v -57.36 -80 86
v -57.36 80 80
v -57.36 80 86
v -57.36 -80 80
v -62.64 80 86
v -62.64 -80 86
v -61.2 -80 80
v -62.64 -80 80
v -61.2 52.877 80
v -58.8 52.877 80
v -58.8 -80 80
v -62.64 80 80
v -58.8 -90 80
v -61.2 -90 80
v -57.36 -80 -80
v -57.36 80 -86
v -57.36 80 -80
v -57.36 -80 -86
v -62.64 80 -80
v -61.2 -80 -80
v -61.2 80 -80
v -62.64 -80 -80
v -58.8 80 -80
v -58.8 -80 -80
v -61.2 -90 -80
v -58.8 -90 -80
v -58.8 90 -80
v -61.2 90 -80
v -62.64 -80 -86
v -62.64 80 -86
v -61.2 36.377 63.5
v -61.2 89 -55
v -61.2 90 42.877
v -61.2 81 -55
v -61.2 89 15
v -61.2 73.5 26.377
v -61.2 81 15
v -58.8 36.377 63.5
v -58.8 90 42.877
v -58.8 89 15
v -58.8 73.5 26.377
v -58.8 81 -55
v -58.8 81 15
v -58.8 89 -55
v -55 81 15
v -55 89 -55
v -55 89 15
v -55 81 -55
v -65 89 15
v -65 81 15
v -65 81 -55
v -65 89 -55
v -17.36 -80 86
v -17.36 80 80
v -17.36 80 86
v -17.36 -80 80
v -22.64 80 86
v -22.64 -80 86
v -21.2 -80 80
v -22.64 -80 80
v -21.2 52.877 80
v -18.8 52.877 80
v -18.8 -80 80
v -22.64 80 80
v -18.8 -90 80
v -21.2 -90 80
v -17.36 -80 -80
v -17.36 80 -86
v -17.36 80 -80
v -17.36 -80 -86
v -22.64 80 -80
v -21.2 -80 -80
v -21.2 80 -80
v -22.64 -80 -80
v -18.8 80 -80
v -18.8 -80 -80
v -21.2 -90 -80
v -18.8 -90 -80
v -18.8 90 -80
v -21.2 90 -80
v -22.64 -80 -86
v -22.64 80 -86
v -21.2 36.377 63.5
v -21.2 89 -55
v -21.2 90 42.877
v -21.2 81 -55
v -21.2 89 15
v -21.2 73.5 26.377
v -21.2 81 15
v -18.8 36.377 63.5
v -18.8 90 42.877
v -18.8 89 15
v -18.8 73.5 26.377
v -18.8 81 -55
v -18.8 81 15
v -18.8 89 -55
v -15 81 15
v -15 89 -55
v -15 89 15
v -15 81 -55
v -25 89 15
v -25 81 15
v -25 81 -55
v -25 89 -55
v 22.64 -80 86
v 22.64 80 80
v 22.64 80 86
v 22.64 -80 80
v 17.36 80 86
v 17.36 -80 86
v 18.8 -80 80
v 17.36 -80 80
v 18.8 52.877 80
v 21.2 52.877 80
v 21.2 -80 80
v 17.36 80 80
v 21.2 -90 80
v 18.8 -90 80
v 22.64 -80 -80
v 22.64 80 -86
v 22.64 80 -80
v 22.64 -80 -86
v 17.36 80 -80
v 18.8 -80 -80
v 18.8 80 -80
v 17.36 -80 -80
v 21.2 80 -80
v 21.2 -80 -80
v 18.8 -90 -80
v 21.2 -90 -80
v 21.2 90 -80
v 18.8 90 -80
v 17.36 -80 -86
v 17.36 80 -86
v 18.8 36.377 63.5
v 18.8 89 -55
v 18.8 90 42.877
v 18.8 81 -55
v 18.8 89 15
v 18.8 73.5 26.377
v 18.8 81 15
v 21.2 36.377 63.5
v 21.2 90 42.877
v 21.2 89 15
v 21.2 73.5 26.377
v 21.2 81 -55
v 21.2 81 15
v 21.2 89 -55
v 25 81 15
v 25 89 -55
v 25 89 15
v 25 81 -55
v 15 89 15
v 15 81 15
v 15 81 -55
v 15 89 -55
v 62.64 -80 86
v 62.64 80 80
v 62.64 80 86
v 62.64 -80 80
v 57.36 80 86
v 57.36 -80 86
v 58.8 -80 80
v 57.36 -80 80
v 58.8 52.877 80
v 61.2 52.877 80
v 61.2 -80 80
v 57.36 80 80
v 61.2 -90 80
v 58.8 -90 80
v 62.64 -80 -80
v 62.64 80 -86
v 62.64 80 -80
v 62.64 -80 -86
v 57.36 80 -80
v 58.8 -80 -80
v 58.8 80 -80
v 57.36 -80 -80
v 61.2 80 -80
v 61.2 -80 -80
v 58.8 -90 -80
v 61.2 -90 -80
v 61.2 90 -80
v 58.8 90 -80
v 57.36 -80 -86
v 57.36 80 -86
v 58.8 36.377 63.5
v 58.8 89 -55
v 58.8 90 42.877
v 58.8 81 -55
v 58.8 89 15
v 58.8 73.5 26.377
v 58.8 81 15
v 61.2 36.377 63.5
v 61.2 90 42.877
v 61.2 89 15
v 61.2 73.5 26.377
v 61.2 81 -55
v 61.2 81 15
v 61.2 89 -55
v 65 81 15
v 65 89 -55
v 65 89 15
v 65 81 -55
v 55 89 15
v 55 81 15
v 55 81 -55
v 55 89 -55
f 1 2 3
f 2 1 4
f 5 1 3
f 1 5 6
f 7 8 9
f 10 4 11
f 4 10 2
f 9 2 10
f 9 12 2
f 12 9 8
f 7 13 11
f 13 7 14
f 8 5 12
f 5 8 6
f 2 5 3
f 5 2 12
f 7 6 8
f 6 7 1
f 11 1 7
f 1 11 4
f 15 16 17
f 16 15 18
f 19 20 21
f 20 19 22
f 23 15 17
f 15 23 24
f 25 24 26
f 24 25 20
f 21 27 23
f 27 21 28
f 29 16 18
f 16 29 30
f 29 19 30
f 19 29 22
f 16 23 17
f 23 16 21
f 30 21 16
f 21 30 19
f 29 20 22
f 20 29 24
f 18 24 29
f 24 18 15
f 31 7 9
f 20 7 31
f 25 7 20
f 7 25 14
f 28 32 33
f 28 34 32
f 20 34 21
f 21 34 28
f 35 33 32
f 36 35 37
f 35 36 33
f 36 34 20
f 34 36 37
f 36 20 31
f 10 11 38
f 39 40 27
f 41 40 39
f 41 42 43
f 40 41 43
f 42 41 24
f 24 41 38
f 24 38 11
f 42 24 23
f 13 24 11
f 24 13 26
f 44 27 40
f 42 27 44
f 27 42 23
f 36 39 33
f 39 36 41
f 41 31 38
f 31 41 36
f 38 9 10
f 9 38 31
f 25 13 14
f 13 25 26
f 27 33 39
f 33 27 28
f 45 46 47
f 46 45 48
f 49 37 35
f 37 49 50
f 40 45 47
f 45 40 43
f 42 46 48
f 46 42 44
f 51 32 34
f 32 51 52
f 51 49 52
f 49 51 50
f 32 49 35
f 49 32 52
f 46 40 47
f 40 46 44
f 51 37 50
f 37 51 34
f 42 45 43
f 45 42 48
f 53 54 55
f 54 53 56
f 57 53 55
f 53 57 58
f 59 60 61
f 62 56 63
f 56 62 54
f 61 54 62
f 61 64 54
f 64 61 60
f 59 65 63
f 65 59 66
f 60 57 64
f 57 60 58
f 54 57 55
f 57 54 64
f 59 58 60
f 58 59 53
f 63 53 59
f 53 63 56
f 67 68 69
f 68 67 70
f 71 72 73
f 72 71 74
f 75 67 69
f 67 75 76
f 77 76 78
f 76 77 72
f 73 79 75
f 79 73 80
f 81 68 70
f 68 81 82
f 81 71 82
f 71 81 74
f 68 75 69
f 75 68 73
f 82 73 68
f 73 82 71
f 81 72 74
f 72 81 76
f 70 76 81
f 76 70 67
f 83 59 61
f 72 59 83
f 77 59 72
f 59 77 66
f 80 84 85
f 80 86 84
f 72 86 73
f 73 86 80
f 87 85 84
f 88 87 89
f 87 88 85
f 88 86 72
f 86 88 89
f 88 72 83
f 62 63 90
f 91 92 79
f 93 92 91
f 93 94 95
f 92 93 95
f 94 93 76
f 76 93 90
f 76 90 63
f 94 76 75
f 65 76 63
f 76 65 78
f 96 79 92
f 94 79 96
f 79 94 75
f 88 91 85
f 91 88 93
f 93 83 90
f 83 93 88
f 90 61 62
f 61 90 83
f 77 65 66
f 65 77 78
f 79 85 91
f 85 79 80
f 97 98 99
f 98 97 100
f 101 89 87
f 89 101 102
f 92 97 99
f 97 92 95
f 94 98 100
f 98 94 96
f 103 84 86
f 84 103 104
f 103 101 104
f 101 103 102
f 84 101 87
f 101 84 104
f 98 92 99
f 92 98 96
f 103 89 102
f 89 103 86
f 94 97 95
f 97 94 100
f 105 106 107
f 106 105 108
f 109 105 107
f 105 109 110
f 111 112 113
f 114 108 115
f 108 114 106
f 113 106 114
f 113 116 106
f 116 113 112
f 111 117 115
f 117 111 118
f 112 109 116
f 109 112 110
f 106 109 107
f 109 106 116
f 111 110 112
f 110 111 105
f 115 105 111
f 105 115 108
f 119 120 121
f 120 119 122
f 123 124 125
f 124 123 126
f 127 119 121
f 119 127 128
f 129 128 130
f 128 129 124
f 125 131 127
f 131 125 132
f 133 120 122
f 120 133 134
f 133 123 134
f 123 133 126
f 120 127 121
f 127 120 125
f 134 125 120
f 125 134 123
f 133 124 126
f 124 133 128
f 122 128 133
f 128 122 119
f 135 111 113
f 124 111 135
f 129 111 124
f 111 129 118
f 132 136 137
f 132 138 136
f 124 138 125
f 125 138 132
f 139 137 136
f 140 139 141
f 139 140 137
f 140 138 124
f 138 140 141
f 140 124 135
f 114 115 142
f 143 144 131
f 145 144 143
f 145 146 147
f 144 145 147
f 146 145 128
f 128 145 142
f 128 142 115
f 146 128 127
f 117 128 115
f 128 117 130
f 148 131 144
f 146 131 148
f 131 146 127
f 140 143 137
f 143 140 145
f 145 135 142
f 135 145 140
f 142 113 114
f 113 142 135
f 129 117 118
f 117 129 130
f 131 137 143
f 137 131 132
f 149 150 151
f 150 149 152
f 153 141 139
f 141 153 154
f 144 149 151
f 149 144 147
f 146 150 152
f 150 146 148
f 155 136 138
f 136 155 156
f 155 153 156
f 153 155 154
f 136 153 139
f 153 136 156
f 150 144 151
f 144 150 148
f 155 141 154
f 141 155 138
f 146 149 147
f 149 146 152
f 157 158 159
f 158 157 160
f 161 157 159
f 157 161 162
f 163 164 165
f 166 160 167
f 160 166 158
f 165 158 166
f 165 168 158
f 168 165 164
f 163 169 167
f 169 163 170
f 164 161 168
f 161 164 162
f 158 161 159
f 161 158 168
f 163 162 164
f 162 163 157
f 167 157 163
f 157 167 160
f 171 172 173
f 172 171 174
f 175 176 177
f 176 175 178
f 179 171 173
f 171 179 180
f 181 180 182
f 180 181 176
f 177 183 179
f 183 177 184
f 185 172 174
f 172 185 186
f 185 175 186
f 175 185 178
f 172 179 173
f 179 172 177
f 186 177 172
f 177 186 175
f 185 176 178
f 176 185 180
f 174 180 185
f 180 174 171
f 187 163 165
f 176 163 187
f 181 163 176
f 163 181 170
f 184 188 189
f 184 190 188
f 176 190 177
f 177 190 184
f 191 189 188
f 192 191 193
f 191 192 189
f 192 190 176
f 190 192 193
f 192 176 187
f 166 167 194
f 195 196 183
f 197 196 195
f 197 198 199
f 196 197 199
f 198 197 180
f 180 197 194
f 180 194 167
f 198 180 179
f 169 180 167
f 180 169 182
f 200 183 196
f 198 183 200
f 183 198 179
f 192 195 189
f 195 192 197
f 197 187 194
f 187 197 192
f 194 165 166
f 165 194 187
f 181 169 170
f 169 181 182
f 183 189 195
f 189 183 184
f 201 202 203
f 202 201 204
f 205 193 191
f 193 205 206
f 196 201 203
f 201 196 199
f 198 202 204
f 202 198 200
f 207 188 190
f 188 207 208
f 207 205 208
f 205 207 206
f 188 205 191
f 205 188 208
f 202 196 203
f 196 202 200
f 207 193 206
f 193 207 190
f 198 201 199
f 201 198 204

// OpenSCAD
// ========================================================
// F-14F AVIONICS UPGRADE KIT - PROFILE-CONTOURED MODULES
// CUSTOM PCB SUBSTRATE SHAPES FOR DROP-IN HOUSING TRAY
// ========================================================

$fn = 40; // Manufacturing-grade edge smoothness

// --- CHASSIS SLOT OPERATIONAL CLEARANCES (mm) ---
card_max_w   = 180; // Total horizontal board insertion width
card_max_h   = 160; // Total vertical clearance height
card_thick   = 2.4; // Ruggedized 6-layer high-tensile PCB thickness

chassis_slope_offset = 35; // The structural chamfer to match the sloped fuselage
tab_height           = 6.0; // Alignment rail guide tabs

// --- COMPONENT COLOR DESIGNATIONS ---
univac_blue  = [0.10, 0.35, 0.70, 1.0]; // Slot 1: 36-Bit Core Fabric Substrate
hex_amber    = [0.80, 0.50, 0.10, 1.0]; // Slot 2: 16-State Hexadecimal Logic Array
aegis_green  = [0.15, 0.65, 0.30, 1.0]; // Slot 3: MIL-STD-1397 Tactical Network Bridge
weather_purp = [0.45, 0.20, 0.60, 1.0]; // Slot 4: Atmospheric Physics Coprocessor
gold_conn    = [0.85, 0.72, 0.32, 1.0]; // Rear-facing card-edge backplane socket block

// ========================================================
// GEOMETRIC BOARD ARCHITECTURE EXTRACTION
// ========================================================

// 1. Core Profile Shape Module (Matches the exact sloped F-14 fuselage contour)
module f14_asymmetric_pcb_profile() {
    rotate([90, 0, 90]) // Align vertical into the slide-rail layout
    linear_extrude(height=card_thick, center=true) {
        difference() {
            // Main rectangular board space starting block
            square([card_max_w, card_max_h], center=true);
            
            // DROP-IN SPECIFIC CUT: Asymmetric upper-right corner chamfer 
            // This prevents the board corner from smashing into the sloped exterior skin
            translate([card_max_w/2 - chassis_slope_offset/2 + 1, card_max_h/2 - chassis_slope_offset/2 + 1, 0])
                rotate([0, 0, 45])
                square([chassis_slope_offset * 1.5, chassis_slope_offset * 1.5], center=true);
        }
    }
}

// 2. High-Strength Top and Bottom Card-Edge Rail Guide Tabs
module structural_rail_guides() {
    // Upper guide tab block
    translate([0, 0, card_max_h/2 + tab_height/2])
        cube([card_thick * 2.2, card_max_w - 20, tab_height], center=true);
    // Lower guide tab block
    translate([0, 0, -card_max_h/2 - tab_height/2])
        cube([card_thick * 2.2, card_max_w - 20, tab_height], center=true);
}

// 3. Complete Assembly Breakdown for the 4 Dedicated Modernization Cards
module complete_contoured_avionics_stack() {
    // Card Slot 1: UNIVAC IX Core Recovery Fabric Card
    translate([-60, 0, 0]) {
        color(univac_blue) f14_asymmetric_pcb_profile();
        color([0.2, 0.2, 0.2]) structural_rail_guides();
        // Rear-Facing Blind-Mate Multi-Pin Edge Socket
        translate([0, card_max_w/2 - 5, -20]) color(gold_conn) cube([10, 8, 70], center=true);
    }
    
    // Card Slot 2: Hexadecimal 16-State Analog Logic Board
    translate([-20, 0, 0]) {
        color(hex_amber) f14_asymmetric_pcb_profile();
        color([0.2, 0.2, 0.2]) structural_rail_guides();
        translate([0, card_max_w/2 - 5, -20]) color(gold_conn) cube([10, 8, 70], center=true);
    }
    
    // Card Slot 3: Univac-Aegis MIL-STD-1397 Tactical Network Bridge
    translate([20, 0, 0]) {
        color(aegis_green) f14_asymmetric_pcb_profile();
        color([0.2, 0.2, 0.2]) structural_rail_guides();
        translate([0, card_max_w/2 - 5, -20]) color(gold_conn) cube([10, 8, 70], center=true);
    }
    
    // Card Slot 4: Basic Aviation Knowledge Environmental Modeling Core
    translate([60, 0, 0]) {
        color(weather_purp) f14_asymmetric_pcb_profile();
        color([0.2, 0.2, 0.2]) structural_rail_guides();
        translate([0, card_max_w/2 - 5, -20]) color(gold_conn) cube([10, 8, 70], center=true);
    }
}

// Execute active rendering tree module
complete_contoured_avionics_stack();
